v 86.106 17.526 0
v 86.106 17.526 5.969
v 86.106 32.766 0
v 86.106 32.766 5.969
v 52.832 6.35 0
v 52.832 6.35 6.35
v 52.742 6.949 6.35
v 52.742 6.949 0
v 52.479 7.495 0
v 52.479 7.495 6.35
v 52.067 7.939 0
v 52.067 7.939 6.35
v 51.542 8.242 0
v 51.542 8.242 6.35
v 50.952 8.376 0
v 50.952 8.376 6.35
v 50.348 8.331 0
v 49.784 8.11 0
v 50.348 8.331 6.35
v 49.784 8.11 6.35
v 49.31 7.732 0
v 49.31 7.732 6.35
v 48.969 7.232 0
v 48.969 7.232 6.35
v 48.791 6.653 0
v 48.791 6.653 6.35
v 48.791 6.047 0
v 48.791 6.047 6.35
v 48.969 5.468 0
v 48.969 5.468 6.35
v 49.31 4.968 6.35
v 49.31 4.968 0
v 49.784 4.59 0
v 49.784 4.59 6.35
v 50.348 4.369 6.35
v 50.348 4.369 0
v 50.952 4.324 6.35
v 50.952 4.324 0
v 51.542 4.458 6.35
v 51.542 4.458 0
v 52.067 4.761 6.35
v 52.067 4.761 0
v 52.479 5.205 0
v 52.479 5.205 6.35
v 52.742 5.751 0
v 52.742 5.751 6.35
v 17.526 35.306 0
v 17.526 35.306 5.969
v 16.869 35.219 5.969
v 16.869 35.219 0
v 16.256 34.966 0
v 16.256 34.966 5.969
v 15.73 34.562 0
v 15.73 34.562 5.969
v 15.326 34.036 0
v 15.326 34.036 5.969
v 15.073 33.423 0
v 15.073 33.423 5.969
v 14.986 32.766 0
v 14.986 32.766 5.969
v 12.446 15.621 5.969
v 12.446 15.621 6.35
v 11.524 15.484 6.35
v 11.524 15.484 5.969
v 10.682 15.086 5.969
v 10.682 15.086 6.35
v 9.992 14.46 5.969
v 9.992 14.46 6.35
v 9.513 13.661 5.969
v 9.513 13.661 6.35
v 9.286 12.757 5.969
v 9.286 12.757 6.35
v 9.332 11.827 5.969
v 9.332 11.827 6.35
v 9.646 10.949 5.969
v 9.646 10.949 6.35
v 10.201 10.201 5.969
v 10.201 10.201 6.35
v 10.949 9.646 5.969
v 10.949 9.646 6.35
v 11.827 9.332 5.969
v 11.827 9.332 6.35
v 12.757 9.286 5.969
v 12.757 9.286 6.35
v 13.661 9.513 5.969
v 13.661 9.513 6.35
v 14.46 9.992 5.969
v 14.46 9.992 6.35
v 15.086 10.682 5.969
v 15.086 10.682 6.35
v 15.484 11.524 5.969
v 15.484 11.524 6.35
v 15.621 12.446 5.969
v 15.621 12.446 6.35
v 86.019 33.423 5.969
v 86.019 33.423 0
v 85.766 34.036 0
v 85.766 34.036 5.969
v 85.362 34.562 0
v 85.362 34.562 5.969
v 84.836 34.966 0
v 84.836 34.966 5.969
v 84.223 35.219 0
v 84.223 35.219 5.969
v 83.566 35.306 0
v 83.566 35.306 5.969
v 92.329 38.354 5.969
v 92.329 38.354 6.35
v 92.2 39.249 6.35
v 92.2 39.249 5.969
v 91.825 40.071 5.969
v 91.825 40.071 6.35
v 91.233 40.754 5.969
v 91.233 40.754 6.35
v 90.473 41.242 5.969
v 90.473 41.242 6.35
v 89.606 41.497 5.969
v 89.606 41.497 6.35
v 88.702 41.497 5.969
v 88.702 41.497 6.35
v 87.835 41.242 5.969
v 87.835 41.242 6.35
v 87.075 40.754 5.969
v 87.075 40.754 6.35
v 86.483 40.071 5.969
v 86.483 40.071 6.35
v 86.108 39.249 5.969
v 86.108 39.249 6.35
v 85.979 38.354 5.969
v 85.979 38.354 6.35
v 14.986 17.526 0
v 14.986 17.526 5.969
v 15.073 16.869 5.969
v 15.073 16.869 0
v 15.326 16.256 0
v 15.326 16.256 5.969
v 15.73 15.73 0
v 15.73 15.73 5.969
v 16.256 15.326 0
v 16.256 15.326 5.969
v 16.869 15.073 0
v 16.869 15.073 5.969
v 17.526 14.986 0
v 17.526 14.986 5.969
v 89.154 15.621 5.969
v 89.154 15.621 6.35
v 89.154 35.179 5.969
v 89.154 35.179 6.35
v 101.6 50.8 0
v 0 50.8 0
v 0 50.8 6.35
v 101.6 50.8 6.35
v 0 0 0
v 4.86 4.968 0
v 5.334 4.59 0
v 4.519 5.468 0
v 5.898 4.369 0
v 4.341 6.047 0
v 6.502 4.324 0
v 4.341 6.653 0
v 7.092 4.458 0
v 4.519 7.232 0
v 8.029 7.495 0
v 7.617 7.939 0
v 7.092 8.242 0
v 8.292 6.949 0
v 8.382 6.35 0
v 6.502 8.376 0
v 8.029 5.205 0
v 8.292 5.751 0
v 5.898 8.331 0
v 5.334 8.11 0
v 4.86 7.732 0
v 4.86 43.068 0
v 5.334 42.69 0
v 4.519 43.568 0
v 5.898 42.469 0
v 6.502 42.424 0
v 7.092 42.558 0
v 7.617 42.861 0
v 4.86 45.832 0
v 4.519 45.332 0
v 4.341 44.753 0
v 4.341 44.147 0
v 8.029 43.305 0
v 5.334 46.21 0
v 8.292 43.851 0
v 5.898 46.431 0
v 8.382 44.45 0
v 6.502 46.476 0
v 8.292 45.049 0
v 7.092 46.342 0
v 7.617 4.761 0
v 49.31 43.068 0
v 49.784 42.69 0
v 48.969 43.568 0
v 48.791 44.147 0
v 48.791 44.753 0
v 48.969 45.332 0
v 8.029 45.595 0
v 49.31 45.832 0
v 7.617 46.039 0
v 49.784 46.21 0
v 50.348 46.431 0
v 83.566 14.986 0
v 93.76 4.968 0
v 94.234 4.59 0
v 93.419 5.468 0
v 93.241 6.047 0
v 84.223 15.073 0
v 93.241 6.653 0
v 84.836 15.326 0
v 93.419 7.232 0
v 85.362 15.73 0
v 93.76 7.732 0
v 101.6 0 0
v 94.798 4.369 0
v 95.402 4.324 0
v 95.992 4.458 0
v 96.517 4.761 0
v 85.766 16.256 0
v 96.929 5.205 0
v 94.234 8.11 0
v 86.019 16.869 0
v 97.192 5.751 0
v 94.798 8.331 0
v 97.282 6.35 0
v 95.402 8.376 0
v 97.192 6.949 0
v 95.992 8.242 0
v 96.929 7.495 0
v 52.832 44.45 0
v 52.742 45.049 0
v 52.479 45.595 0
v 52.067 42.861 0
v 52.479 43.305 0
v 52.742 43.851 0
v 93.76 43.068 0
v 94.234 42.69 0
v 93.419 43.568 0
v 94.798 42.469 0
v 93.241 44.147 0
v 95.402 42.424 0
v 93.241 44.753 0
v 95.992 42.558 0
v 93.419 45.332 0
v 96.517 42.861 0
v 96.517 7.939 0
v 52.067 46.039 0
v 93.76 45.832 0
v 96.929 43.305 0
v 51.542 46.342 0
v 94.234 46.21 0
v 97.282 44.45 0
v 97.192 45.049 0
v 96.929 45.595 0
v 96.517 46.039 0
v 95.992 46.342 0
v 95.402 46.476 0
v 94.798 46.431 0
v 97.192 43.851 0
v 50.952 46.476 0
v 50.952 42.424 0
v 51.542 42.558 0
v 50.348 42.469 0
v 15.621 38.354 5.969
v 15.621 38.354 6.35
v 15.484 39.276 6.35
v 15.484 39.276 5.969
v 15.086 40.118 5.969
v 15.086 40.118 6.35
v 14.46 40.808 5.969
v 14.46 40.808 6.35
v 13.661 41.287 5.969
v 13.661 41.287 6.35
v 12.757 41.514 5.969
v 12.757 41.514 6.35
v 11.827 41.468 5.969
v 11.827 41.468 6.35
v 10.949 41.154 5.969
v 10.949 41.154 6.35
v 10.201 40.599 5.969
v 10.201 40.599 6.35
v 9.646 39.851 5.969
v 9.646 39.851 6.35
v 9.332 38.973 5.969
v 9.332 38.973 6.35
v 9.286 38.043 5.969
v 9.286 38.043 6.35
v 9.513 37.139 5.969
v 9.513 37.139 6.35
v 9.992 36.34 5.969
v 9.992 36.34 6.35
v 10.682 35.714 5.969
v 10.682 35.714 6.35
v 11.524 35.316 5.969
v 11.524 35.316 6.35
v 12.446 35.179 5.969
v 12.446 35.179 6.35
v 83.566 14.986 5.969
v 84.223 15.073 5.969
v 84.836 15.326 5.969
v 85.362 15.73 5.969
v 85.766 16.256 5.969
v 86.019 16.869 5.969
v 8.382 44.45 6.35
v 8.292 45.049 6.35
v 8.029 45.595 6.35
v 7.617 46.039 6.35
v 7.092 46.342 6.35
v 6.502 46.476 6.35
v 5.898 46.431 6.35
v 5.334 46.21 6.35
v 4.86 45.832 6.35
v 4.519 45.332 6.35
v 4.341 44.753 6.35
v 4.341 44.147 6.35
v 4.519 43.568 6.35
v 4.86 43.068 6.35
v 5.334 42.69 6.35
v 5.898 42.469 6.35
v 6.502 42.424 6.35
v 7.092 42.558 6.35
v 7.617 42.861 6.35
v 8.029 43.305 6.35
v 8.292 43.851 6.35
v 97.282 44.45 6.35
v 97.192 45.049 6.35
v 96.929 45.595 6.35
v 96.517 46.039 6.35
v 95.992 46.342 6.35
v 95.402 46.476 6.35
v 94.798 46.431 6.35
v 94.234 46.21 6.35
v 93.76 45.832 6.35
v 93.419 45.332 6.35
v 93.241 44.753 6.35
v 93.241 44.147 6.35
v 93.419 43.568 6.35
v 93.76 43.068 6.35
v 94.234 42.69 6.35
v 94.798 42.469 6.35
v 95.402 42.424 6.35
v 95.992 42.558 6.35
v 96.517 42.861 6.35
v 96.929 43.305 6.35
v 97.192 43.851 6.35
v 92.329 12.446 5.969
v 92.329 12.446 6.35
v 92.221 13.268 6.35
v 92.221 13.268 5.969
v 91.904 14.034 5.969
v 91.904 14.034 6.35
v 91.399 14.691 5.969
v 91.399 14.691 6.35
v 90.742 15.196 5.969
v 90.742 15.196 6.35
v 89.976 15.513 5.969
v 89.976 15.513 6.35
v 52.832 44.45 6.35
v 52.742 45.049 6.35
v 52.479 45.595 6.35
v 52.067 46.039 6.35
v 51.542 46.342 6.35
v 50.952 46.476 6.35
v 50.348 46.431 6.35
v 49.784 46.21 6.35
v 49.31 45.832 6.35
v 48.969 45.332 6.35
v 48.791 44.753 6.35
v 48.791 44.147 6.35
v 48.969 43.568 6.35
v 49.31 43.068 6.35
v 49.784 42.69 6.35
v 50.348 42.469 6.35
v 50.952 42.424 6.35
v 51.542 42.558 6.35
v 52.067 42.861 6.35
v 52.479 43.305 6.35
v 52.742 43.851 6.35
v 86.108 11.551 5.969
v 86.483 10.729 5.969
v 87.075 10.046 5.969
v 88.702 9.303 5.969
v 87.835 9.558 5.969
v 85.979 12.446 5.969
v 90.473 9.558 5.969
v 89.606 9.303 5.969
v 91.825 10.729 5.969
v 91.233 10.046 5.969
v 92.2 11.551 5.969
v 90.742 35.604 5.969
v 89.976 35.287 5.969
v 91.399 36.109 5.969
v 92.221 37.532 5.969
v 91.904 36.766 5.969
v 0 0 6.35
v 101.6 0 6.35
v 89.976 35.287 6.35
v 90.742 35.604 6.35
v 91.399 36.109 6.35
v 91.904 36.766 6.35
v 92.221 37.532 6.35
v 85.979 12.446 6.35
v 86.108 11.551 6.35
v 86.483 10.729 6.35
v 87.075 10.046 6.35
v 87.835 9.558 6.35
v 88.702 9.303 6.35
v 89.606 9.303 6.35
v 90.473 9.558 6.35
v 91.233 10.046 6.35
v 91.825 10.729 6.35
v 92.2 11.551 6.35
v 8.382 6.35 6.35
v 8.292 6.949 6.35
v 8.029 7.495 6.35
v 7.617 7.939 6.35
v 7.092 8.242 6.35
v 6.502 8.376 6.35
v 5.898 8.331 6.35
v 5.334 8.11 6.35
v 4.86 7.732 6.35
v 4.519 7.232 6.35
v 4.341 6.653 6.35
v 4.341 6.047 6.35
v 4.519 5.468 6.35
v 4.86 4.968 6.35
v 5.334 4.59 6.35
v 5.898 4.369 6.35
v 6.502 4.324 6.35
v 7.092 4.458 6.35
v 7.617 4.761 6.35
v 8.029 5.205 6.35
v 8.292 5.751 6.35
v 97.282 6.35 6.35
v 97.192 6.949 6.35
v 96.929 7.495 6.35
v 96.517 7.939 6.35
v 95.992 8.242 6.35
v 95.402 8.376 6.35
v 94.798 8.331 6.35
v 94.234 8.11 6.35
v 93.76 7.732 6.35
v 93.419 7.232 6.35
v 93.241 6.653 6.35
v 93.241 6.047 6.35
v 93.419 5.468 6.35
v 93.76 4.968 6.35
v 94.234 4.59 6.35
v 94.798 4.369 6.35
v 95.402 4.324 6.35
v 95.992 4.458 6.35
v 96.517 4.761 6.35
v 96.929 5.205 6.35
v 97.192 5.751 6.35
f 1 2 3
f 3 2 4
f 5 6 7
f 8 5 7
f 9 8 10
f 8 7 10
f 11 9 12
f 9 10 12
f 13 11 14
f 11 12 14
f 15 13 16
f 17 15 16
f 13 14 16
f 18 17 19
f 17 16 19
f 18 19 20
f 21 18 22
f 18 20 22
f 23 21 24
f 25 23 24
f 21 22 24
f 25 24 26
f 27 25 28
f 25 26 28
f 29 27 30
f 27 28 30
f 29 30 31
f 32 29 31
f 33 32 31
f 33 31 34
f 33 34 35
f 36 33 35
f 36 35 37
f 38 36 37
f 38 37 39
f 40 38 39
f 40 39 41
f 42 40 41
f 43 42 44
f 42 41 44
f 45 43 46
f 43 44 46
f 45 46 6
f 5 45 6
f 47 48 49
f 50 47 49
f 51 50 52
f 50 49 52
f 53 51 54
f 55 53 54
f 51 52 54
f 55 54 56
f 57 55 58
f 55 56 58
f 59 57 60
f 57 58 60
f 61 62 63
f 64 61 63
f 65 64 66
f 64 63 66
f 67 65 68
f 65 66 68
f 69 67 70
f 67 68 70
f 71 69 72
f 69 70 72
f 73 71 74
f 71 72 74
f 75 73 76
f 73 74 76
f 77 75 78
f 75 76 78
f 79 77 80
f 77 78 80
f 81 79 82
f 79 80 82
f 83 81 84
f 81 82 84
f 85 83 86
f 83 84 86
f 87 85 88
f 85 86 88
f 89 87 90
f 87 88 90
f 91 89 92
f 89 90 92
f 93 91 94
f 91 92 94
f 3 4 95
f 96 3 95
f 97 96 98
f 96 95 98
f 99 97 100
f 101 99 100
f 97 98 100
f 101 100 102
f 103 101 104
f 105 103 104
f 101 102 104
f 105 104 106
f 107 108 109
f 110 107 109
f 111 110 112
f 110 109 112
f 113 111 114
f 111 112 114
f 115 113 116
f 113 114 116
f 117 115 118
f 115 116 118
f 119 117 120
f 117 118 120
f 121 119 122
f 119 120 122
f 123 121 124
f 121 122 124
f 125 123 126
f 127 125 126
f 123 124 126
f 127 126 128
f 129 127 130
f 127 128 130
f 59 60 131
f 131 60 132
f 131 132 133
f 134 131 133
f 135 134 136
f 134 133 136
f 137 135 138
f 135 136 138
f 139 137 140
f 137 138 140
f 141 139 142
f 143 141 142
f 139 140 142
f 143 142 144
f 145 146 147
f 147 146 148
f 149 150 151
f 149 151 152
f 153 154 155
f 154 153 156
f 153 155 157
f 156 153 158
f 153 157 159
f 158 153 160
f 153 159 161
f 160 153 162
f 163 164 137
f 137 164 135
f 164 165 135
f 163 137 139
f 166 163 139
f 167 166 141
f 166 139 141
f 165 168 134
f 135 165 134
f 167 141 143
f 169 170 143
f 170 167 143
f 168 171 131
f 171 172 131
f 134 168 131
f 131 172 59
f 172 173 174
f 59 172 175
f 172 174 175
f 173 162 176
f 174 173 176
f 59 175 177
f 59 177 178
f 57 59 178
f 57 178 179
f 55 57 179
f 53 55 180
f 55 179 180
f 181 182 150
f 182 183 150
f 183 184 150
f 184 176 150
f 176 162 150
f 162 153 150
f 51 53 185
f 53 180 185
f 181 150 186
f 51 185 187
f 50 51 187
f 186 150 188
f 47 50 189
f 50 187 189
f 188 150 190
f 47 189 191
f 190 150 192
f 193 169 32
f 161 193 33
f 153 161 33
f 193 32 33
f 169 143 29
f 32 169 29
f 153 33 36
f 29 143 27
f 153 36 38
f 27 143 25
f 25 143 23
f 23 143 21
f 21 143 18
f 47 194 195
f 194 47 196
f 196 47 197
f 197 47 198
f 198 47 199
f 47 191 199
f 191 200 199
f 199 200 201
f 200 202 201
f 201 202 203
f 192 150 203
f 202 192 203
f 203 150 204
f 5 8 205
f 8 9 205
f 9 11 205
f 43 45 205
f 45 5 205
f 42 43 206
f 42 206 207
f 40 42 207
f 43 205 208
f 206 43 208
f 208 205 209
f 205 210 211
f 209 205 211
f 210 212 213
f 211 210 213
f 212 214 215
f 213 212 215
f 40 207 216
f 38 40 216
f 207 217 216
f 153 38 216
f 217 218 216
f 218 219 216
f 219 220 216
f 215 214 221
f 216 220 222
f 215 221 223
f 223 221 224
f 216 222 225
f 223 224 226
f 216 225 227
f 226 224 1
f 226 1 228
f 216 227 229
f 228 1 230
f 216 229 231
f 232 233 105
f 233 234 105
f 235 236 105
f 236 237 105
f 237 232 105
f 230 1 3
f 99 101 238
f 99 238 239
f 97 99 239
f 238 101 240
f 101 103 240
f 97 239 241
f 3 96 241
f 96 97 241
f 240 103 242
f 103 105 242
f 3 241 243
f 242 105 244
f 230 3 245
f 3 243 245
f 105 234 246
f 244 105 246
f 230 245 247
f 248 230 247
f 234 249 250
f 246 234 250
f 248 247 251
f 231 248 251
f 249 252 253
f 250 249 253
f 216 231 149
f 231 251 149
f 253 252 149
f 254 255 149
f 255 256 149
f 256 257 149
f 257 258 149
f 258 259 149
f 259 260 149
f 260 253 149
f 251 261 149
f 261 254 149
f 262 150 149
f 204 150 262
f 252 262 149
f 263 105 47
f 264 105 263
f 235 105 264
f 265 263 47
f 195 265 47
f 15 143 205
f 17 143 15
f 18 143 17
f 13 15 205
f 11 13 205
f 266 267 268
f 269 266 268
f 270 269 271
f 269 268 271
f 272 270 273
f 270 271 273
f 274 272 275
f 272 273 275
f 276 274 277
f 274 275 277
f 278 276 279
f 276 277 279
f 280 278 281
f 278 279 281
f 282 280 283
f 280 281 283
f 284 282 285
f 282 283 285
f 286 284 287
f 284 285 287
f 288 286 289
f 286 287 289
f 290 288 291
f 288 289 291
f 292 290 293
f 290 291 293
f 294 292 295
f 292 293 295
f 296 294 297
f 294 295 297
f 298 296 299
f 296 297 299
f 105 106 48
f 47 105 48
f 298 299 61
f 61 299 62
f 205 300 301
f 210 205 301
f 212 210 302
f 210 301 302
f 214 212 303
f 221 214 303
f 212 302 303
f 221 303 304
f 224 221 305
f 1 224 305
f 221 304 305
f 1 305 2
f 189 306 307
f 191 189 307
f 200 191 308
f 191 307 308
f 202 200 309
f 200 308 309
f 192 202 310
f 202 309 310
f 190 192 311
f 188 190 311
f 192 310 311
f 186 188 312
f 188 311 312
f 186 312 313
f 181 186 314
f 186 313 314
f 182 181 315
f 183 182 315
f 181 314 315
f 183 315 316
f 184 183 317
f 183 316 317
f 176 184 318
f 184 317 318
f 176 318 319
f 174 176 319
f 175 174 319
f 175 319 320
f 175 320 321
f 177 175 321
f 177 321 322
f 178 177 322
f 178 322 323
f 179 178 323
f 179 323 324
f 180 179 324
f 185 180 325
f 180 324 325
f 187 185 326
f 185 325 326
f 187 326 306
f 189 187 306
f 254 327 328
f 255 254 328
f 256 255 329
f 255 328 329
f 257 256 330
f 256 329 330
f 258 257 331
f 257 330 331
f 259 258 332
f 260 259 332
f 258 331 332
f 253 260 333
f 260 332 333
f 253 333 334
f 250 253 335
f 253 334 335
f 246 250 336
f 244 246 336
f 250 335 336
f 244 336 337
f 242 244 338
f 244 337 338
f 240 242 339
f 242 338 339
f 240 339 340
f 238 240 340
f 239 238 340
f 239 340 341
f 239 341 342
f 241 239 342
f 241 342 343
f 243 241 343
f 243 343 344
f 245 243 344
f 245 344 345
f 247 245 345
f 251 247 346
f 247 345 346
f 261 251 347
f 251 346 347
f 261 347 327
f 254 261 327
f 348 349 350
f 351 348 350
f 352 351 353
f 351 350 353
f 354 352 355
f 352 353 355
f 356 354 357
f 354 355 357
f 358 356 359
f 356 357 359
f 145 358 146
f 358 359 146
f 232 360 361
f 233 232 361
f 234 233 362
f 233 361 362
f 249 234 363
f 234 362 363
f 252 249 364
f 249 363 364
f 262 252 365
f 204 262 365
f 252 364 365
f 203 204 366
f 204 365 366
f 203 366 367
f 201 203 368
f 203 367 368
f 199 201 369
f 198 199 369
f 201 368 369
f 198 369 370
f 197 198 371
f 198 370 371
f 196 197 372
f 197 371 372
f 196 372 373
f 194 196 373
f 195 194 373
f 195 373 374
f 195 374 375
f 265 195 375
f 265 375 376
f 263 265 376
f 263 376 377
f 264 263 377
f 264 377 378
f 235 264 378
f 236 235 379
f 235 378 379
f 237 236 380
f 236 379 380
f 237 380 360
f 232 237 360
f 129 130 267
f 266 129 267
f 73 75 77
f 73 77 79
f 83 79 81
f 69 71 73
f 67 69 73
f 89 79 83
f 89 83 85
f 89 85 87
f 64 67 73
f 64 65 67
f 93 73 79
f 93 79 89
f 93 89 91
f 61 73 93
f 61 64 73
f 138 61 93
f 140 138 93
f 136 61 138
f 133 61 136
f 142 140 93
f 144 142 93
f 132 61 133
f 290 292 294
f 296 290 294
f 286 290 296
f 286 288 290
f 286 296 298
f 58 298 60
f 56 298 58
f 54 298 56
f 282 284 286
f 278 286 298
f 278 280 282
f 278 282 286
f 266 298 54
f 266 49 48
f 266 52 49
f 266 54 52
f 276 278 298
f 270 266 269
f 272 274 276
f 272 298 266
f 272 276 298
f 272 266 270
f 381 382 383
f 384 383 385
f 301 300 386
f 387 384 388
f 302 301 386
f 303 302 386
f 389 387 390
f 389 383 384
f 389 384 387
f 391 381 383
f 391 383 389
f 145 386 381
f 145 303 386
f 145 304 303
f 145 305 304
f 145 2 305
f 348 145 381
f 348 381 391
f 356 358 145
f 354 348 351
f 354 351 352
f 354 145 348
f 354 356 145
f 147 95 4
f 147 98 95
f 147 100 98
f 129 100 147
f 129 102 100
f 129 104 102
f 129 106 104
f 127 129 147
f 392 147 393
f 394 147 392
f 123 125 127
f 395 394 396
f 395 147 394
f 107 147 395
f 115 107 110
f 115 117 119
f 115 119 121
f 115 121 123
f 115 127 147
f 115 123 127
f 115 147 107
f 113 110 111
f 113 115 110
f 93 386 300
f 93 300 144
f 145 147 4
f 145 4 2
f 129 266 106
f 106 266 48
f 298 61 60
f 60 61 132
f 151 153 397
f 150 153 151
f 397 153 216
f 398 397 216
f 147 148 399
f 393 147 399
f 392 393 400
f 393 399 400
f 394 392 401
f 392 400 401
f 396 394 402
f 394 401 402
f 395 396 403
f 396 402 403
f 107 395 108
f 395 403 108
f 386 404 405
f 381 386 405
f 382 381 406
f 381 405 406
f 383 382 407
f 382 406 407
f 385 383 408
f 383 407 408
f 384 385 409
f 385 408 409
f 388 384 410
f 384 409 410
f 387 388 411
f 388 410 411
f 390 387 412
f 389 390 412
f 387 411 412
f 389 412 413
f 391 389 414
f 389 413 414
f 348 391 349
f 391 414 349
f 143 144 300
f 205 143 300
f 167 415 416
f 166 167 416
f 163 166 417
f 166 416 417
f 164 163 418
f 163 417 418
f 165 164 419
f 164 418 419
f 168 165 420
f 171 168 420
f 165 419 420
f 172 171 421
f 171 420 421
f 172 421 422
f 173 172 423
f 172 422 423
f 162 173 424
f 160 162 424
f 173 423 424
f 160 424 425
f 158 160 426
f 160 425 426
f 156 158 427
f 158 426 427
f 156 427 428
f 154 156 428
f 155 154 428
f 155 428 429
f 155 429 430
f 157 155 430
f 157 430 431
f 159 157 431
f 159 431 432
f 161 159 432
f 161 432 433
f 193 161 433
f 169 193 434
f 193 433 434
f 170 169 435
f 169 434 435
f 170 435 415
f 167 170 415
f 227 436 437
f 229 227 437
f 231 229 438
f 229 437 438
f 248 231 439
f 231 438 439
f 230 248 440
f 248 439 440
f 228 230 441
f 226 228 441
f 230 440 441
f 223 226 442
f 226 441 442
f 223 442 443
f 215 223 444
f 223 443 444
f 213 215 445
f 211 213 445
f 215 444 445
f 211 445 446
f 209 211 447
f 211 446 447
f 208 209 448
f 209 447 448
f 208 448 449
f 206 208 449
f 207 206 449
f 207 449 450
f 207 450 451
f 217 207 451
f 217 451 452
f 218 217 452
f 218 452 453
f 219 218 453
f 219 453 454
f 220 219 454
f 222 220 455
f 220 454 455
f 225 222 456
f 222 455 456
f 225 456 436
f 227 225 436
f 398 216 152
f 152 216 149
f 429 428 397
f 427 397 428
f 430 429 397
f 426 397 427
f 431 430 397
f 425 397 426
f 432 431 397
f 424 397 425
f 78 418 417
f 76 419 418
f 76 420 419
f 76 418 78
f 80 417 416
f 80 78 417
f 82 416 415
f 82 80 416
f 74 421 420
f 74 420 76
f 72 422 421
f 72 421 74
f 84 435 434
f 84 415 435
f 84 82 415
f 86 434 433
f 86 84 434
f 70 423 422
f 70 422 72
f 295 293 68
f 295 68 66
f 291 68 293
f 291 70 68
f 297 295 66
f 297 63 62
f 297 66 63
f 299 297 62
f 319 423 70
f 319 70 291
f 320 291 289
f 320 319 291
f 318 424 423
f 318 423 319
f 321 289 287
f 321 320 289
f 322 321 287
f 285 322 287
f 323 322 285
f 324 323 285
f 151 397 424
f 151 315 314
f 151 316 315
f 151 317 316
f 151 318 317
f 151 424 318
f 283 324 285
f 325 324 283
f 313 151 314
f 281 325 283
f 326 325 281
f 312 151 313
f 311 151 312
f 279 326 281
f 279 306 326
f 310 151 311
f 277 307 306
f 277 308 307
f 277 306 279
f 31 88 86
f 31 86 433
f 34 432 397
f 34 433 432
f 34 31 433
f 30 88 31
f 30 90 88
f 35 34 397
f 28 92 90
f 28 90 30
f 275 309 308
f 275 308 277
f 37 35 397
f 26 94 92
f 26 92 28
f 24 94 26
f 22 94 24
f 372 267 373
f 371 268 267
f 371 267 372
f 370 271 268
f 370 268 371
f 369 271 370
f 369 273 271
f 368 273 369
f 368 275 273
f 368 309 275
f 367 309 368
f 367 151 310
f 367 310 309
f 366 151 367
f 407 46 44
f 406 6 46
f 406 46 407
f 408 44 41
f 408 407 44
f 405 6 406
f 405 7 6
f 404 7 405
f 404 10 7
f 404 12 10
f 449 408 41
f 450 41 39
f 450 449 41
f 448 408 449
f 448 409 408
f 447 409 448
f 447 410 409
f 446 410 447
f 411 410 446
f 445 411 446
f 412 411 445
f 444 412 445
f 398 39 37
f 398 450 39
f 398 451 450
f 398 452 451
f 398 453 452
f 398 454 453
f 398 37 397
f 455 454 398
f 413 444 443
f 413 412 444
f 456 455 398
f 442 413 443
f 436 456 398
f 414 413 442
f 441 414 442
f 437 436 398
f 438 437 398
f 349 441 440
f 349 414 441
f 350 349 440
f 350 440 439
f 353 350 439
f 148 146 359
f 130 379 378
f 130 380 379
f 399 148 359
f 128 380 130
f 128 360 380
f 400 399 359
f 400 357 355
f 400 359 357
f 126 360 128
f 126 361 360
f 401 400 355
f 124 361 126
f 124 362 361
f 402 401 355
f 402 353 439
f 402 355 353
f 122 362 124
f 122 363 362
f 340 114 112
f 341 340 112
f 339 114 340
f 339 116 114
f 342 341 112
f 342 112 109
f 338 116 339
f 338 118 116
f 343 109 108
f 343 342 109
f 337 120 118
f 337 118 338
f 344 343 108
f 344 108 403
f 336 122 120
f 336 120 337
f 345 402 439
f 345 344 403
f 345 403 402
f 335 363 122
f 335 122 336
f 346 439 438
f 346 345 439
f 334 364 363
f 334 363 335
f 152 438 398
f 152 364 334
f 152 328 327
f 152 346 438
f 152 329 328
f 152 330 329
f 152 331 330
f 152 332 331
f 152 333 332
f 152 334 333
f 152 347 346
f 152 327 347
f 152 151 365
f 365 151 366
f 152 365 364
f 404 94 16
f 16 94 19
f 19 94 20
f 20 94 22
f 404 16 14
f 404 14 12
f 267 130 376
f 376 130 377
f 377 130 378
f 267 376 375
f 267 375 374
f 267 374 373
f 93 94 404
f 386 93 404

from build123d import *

# Parameters (mm, degrees)
F0_W     = 101.6
F0_H     = 50.8
F1_DEPTH = 6.35
F3_DEPTH = 0.381
F5_DEPTH = 5.969
F6_R     = 2.032
F7_DEPTH = 6.35


with BuildPart() as f1:
    # F0 (on Top) → F1 (new body)
    with BuildSketch(Plane.XY):
        with Locations((50.8, 25.4)):
            Rectangle(F0_W, F0_H)
    extrude(amount=F1_DEPTH)

    # F2 (on face) → F3 (cut)
    with BuildSketch(Plane.XY.offset(6.35)):
        with BuildLine():
            ThreePointArc((12.446, 15.621), (14.6910640303, 14.6910640303), (15.621, 12.446))
            Line((15.621, 12.446), (85.979, 12.446))
            ThreePointArc((85.979, 12.446), (86.9089359697, 14.6910640303), (89.154, 15.621))
            Line((89.154, 15.621), (89.154, 35.179))
            ThreePointArc((89.154, 35.179), (86.9089359697, 36.1089359697), (85.979, 38.354))
            Line((85.979, 38.354), (15.621, 38.354))
            ThreePointArc((15.621, 38.354), (14.6910640303, 36.1089359697), (12.446, 35.179))
            Line((12.446, 35.179), (12.446, 15.621))
        make_face()
        with BuildLine():
            Line((89.154, 38.354), (89.154, 35.179))
            ThreePointArc((89.154, 35.179), (91.3990640303, 36.1089359697), (92.329, 38.354))
            ThreePointArc((92.329, 38.354), (89.154, 41.529), (85.979, 38.354))
            Line((85.979, 38.354), (89.154, 38.354))
        make_face()
        with BuildLine():
            ThreePointArc((85.979, 38.354), (86.9089359697, 36.1089359697), (89.154, 35.179))
            Line((89.154, 35.179), (89.154, 38.354))
            Line((89.154, 38.354), (85.979, 38.354))
        make_face()
        with BuildLine():
            Line((12.446, 38.354), (12.446, 35.179))
            ThreePointArc((12.446, 35.179), (14.6910640303, 36.1089359697), (15.621, 38.354))
            Line((15.621, 38.354), (12.446, 38.354))
        make_face()
        with BuildLine():
            ThreePointArc((15.621, 38.354), (10.2009359697, 40.5990640303), (12.446, 35.179))
            Line((12.446, 35.179), (12.446, 38.354))
            Line((12.446, 38.354), (15.621, 38.354))
        make_face()
        with BuildLine():
            Line((89.154, 12.446), (85.979, 12.446))
            ThreePointArc((85.979, 12.446), (89.154, 9.271), (92.329, 12.446))
            ThreePointArc((92.329, 12.446), (91.3990640303, 14.6910640303), (89.154, 15.621))
            Line((89.154, 15.621), (89.154, 12.446))
        make_face()
        with BuildLine():
            ThreePointArc((89.154, 15.621), (86.9089359697, 14.6910640303), (85.979, 12.446))
            Line((85.979, 12.446), (89.154, 12.446))
            Line((89.154, 12.446), (89.154, 15.621))
        make_face()
        with BuildLine():
            Line((15.621, 12.446), (12.446, 12.446))
            Line((12.446, 12.446), (12.446, 15.621))
            ThreePointArc((12.446, 15.621), (10.2009359697, 10.2009359697), (15.621, 12.446))
        make_face()
        with BuildLine():
            Line((12.446, 15.621), (12.446, 12.446))
            Line((12.446, 12.446), (15.621, 12.446))
            ThreePointArc((15.621, 12.446), (14.6910640303, 14.6910640303), (12.446, 15.621))
        make_face()
    extrude(amount=-F3_DEPTH, mode=Mode.SUBTRACT)

    # F4 (on face) → F5 (cut, through all)
    with BuildSketch(Plane.XY.offset(5.969)):
        with BuildLine():
            ThreePointArc((14.986, 17.526), (15.7299487758, 15.7299487758), (17.526, 14.986))
            Line((17.526, 14.986), (83.566, 14.986))
            ThreePointArc((83.566, 14.986), (85.3620512242, 15.7299487758), (86.106, 17.526))
            Line((86.106, 17.526), (86.106, 32.766))
            ThreePointArc((86.106, 32.766), (85.3620512242, 34.5620512242), (83.566, 35.306))
            Line((83.566, 35.306), (17.526, 35.306))
            ThreePointArc((17.526, 35.306), (15.7299487758, 34.5620512242), (14.986, 32.766))
            Line((14.986, 32.766), (14.986, 17.526))
        make_face()
    extrude(amount=-F5_DEPTH, mode=Mode.SUBTRACT)

    # F6 (on face) → F7 (cut, through all)
    with BuildSketch(Plane.XY.offset(6.35)):
        with Locations((6.35, 44.45)):
            Circle(F6_R)
        with Locations((50.8, 44.45)):
            Circle(F6_R)
        with Locations((95.25, 44.45)):
            Circle(F6_R)
        with Locations((95.25, 6.35)):
            Circle(F6_R)
        with Locations((50.8, 6.35)):
            Circle(F6_R)
        with Locations((6.35, 6.35)):
            Circle(F6_R)
    extrude(amount=-F7_DEPTH, mode=Mode.SUBTRACT)


solid = f1.part
